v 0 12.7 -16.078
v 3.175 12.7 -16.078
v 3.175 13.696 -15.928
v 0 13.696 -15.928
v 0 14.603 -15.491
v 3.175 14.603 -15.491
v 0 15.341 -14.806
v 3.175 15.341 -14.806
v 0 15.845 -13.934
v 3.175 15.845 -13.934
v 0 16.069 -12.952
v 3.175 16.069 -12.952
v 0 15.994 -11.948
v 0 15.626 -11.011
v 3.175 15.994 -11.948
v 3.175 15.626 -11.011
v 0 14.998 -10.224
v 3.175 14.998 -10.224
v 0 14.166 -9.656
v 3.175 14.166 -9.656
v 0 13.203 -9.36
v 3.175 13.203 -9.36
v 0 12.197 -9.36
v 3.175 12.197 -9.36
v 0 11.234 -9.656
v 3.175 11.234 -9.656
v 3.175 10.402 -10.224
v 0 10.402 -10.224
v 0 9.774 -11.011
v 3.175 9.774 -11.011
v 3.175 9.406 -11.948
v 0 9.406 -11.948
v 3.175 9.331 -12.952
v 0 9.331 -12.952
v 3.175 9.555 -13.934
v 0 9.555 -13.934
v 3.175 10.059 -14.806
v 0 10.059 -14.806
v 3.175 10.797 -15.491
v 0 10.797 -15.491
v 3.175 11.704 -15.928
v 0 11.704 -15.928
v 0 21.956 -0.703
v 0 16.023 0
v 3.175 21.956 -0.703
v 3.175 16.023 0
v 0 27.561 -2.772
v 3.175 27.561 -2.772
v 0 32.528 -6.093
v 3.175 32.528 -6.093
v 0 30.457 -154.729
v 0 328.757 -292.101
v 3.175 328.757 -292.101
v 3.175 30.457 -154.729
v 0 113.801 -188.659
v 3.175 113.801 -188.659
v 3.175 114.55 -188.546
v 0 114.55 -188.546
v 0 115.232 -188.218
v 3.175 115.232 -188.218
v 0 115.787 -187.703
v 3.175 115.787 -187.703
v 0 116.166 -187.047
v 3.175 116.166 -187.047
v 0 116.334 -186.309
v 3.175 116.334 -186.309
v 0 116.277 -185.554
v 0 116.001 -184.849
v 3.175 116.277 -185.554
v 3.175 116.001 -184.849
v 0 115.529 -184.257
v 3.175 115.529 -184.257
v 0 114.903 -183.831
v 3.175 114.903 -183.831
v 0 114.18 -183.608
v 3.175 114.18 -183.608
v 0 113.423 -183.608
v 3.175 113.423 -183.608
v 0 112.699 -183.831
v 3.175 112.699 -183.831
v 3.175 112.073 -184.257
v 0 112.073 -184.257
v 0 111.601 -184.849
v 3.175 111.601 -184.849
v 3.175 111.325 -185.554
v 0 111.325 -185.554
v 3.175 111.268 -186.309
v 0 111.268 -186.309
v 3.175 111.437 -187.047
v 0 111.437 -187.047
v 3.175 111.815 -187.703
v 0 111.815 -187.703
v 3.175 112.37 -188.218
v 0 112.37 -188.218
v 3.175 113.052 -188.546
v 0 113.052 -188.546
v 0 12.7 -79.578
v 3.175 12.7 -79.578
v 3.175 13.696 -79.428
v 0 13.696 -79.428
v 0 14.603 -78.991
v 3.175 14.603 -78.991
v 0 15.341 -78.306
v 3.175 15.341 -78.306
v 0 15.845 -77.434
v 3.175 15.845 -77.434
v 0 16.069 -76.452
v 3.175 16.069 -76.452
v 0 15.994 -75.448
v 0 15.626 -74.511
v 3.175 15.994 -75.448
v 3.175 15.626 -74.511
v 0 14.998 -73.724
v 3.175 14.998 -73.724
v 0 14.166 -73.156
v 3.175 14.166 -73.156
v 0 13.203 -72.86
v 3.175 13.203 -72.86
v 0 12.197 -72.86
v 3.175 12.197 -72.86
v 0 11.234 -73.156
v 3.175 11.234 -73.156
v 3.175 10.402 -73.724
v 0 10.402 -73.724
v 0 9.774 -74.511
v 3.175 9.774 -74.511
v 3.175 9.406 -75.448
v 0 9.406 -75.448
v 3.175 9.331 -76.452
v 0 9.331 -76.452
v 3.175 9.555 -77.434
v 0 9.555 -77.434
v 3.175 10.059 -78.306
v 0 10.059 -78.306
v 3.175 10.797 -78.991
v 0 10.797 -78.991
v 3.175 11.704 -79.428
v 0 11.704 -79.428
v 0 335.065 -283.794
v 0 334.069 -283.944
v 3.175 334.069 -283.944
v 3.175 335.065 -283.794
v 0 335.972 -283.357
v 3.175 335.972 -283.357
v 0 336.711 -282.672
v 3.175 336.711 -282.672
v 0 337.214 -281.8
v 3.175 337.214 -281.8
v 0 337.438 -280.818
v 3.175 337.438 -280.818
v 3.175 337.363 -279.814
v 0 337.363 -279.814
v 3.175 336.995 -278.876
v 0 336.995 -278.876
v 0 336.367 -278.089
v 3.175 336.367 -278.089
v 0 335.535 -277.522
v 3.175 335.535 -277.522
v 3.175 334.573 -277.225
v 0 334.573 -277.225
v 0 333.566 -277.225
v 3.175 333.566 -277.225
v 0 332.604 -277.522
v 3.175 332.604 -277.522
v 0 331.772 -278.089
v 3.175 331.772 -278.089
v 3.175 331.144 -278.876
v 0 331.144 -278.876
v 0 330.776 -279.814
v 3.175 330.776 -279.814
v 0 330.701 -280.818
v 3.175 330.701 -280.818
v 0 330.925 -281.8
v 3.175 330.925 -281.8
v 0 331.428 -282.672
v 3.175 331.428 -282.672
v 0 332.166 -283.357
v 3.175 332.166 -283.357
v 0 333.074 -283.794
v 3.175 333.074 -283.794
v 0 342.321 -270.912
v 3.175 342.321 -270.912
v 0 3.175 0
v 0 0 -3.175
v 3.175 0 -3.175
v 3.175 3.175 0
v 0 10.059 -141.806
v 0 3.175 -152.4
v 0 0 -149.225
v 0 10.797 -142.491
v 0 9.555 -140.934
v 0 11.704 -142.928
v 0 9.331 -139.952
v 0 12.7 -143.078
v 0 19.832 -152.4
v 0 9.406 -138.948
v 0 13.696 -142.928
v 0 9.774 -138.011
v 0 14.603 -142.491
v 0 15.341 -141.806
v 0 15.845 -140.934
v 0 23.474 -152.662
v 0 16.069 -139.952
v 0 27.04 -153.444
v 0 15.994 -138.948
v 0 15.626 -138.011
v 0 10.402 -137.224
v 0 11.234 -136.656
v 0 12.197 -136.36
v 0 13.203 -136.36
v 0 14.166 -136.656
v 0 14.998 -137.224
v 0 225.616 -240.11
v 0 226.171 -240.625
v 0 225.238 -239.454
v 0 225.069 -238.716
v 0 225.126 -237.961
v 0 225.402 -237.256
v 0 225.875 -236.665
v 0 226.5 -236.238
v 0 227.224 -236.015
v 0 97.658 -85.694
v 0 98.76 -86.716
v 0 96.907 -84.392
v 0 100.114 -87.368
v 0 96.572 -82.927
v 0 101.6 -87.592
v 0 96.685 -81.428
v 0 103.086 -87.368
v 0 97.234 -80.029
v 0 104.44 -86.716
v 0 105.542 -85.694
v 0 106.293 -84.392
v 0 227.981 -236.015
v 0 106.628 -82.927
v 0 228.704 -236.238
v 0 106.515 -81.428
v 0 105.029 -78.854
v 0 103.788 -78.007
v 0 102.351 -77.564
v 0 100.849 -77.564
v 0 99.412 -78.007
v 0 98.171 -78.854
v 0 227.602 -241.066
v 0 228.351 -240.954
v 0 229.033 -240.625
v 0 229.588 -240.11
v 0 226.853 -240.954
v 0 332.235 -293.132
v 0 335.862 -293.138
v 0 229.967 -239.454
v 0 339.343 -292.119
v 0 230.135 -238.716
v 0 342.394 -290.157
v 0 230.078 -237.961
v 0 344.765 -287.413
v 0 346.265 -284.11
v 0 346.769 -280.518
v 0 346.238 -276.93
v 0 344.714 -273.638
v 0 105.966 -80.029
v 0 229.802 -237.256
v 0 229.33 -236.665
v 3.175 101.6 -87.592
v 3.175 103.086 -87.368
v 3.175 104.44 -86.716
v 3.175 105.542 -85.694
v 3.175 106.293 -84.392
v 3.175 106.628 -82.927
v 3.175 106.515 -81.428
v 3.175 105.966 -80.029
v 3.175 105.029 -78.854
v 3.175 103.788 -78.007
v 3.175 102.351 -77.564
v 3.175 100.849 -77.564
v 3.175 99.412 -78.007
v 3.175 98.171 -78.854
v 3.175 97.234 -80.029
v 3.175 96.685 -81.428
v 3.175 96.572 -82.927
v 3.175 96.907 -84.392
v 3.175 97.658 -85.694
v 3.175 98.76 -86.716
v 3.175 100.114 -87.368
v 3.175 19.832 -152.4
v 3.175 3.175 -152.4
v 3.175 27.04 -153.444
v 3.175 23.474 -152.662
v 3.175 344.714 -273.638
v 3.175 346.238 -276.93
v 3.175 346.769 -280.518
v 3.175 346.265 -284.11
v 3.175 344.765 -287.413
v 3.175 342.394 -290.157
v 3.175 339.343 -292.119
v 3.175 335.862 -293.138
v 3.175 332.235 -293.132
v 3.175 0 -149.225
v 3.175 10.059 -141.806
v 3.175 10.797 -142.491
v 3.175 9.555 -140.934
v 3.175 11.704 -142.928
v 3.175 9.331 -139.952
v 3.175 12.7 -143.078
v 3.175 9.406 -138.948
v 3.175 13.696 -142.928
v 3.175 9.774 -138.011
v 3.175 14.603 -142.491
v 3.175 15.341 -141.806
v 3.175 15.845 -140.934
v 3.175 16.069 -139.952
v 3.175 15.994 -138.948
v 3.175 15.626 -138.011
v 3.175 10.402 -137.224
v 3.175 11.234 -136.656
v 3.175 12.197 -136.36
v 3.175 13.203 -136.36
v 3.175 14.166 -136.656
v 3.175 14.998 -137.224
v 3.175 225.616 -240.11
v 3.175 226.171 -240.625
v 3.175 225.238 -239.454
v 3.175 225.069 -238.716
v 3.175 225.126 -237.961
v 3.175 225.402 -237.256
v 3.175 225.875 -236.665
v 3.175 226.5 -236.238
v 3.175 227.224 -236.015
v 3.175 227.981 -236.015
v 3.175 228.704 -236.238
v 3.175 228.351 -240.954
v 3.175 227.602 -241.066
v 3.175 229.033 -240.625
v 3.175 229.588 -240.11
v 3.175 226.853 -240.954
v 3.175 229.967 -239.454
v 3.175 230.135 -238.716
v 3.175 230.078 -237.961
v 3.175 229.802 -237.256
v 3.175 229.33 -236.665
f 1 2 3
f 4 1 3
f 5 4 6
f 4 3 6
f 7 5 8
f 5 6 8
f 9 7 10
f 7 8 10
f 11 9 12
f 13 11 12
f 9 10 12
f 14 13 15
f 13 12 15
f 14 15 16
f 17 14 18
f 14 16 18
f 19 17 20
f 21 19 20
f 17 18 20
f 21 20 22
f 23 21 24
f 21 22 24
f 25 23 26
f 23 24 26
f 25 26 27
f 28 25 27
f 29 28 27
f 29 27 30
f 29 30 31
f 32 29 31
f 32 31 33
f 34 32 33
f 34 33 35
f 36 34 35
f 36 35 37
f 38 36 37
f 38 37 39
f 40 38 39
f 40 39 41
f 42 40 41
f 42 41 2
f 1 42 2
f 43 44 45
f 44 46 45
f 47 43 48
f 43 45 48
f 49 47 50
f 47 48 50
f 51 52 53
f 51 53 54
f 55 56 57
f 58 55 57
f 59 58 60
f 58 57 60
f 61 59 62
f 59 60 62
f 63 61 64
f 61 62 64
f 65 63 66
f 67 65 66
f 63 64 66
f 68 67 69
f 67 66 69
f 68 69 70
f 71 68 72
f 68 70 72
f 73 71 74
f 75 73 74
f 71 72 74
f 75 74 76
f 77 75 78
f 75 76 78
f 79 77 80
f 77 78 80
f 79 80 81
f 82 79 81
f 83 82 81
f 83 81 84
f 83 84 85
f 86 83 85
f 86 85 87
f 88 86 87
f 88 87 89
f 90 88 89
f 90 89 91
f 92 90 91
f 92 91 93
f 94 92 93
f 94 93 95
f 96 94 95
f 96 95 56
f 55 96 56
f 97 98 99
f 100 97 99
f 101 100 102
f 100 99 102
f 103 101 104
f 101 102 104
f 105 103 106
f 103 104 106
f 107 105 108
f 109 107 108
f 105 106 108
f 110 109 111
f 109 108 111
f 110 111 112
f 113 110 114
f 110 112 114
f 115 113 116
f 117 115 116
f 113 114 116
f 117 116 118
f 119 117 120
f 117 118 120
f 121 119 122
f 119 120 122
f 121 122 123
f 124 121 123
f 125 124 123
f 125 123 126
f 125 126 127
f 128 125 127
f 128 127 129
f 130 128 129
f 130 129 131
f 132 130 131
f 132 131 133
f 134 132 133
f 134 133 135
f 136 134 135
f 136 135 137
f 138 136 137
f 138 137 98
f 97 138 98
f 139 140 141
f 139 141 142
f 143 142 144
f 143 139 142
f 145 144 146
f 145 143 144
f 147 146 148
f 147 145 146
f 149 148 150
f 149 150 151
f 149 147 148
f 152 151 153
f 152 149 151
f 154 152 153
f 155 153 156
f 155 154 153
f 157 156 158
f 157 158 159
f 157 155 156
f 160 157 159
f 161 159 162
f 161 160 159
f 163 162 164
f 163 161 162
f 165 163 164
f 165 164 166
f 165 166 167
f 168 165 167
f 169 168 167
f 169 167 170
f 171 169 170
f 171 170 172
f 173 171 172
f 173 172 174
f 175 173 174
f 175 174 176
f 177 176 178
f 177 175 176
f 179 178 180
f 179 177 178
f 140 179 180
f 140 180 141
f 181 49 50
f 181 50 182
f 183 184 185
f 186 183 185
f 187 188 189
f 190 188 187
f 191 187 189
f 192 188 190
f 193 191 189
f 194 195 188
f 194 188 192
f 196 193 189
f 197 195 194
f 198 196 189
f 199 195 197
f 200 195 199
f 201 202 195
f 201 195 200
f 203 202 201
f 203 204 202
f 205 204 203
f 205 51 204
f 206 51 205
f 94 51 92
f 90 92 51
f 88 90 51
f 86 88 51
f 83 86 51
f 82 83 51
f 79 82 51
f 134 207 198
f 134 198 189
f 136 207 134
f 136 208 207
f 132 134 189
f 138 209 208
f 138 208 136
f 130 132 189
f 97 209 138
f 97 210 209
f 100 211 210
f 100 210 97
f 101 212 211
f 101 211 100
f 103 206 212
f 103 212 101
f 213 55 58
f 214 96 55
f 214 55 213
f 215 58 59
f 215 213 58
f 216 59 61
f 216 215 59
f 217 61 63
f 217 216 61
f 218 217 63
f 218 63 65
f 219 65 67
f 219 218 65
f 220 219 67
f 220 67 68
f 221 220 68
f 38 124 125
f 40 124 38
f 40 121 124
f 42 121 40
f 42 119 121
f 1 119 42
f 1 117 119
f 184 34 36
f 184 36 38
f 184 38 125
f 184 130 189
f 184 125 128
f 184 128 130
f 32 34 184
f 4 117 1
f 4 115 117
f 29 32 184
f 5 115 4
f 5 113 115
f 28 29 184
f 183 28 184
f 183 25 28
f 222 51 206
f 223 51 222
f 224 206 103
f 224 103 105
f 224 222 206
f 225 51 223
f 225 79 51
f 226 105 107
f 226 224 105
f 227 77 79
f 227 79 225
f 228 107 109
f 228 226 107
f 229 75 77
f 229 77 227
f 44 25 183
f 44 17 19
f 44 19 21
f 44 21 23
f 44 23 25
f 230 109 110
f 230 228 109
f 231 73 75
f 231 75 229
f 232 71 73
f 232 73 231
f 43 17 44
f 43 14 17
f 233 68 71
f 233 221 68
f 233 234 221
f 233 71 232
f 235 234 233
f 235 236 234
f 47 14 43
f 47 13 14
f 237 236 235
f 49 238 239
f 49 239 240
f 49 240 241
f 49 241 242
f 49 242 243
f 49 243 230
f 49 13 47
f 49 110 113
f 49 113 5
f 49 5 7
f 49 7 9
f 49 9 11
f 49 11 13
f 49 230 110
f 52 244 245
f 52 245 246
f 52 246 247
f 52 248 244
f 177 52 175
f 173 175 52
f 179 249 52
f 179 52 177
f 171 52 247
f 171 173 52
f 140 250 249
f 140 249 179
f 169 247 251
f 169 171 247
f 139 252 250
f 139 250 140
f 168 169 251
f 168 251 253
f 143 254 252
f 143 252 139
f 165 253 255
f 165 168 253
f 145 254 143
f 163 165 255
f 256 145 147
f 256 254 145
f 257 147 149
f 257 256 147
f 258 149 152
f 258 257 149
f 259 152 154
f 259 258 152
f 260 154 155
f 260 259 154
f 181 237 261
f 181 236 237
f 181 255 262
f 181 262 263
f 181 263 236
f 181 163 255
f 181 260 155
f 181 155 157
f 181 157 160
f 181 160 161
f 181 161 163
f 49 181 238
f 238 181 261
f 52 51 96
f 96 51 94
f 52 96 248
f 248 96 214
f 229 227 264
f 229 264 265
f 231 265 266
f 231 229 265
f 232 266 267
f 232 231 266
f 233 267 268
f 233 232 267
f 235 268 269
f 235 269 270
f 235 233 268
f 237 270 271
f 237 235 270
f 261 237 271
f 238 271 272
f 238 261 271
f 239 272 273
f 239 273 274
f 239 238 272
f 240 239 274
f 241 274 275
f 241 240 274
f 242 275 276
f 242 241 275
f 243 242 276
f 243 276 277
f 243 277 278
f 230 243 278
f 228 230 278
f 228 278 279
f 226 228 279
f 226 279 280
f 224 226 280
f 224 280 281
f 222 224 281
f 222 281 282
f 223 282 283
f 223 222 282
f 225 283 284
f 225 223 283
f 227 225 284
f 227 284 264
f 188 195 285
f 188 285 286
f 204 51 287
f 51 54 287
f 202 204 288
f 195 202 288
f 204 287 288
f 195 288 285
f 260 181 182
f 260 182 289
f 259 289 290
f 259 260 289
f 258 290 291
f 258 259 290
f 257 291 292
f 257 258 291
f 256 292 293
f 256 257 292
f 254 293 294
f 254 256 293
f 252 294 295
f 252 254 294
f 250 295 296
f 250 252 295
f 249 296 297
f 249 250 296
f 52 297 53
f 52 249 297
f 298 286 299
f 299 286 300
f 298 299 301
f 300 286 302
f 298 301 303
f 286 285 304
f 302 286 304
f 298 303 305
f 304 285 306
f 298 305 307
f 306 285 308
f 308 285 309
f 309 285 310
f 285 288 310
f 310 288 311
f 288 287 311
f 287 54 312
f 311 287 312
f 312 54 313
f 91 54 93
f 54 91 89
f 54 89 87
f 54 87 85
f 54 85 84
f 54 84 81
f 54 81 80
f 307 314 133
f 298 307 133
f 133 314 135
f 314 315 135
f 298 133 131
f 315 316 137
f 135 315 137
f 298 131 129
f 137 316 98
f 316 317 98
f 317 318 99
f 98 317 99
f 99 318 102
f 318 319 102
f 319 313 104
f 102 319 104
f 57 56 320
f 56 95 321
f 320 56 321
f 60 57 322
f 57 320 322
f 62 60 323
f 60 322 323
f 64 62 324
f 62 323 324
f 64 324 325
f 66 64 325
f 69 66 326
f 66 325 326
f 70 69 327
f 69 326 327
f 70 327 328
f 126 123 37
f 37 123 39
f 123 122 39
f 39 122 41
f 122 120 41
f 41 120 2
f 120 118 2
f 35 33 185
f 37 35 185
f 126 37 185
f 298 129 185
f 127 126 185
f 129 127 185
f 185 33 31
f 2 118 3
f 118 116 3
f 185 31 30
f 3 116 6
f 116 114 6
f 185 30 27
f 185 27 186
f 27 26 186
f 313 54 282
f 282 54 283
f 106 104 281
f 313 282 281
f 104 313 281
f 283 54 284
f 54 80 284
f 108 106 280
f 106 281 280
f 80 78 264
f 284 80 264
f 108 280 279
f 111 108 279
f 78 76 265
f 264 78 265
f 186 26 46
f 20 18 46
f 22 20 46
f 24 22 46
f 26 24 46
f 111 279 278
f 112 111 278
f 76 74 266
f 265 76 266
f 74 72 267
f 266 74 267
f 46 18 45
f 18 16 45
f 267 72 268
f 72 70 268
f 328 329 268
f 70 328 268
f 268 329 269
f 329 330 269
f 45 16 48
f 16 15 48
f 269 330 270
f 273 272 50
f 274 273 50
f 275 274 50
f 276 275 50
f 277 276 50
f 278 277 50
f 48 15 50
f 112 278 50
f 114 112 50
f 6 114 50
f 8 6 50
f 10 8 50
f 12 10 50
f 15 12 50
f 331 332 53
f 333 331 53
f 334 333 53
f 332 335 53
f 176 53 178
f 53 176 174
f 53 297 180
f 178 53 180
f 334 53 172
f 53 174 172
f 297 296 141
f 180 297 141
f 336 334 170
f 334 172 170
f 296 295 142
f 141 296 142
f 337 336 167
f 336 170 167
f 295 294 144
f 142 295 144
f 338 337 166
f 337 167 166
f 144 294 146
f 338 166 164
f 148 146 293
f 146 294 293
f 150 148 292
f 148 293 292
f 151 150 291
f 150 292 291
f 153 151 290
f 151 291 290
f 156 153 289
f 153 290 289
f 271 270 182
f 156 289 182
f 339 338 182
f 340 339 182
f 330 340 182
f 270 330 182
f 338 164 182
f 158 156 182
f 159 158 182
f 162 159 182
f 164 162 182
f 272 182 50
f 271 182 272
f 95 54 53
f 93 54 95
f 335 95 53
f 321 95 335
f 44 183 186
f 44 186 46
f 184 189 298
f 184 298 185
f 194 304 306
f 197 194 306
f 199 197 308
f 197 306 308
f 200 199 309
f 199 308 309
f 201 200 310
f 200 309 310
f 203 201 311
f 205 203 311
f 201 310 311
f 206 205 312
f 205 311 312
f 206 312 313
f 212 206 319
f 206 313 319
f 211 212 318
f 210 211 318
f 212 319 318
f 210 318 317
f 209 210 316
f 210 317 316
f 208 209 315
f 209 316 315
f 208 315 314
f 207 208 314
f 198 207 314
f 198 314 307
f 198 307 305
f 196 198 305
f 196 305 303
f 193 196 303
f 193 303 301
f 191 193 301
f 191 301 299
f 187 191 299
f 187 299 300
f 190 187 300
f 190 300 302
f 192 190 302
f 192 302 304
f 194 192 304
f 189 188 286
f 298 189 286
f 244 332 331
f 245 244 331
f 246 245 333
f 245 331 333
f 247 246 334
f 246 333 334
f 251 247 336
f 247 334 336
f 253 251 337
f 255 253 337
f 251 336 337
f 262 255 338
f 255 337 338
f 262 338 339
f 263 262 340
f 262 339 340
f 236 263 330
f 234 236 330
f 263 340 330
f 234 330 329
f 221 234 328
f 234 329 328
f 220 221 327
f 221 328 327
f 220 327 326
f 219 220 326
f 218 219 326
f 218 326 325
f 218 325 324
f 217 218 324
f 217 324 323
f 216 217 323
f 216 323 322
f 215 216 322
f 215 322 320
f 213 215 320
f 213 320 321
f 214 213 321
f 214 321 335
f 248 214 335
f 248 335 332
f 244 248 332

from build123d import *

# Parameters (mm, degrees)
SKETCH2_R           = 5.0419
SKETCH2_R_2         = 3.3782
BOSS_EXTRUDE2_DEPTH = 3.175
SKETCH3_R           = 3.3782
SKETCH3_R_2         = 2.54
CUT_EXTRUDE1_DEPTH  = 4.175
CHAMFER1_SIZE       = 3.175
FILLET1_R           = 25.4


with BuildPart() as part:
    # Sketch2 → Boss-Extrude2 (new body)
    with BuildSketch(Plane(origin=(0, 0, 0), x_dir=(0, 0, -1), z_dir=(1, 0, 0))):
        with BuildLine():
            Line((0, 0), (0, 25.4))
            Line((0, 25.4), (270.911778308, 342.321467673))
            ThreePointArc((270.911778308, 342.321467673), (287.412585426, 344.765407005), (292.10095893, 328.757014554))
            Line((292.10095893, 328.757014554), (152.4, 25.4))
            Line((152.4, 25.4), (152.4, 0))
            Line((152.4, 0), (0, 0))
        make_face()
        with Locations((82.55, 101.6)):
            Circle(SKETCH2_R, mode=Mode.SUBTRACT)
        with Locations((280.565394007, 334.069334376)):
            Circle(SKETCH2_R_2, mode=Mode.SUBTRACT)
    extrude(amount=BOSS_EXTRUDE2_DEPTH)

    # Sketch3 → Cut-Extrude1 (cut, through all)
    with BuildSketch(Plane(origin=(3.175, 0, 0), x_dir=(0, 0, -1), z_dir=(1, 0, 0))):
        with Locations((12.7, 12.7)):
            Circle(SKETCH3_R)
        with Locations((76.2, 12.7)):
            Circle(SKETCH3_R)
        with Locations((139.7, 12.7)):
            Circle(SKETCH3_R)
        with Locations((238.526483092, 227.602177824)):
            Circle(SKETCH3_R_2)
        with Locations((186.119185797, 113.801088912)):
            Circle(SKETCH3_R_2)
    extrude(amount=-CUT_EXTRUDE1_DEPTH, mode=Mode.SUBTRACT)

    # Chamfer1
    chamfer1_edges = [part.edges().sort_by_distance(p)[0] for p in [
        (1.5875, 0, 0),
        (1.5875, 0, -152.4),
    ]]
    chamfer(chamfer1_edges, length=CHAMFER1_SIZE)

    # Fillet1
    fillet1_edges = [part.edges().sort_by_distance(p)[0] for p in [
        (1.5875, 25.4, 0),
        (1.5875, 25.4, -152.4),
    ]]
    fillet(fillet1_edges, radius=FILLET1_R)


solid = part.part
